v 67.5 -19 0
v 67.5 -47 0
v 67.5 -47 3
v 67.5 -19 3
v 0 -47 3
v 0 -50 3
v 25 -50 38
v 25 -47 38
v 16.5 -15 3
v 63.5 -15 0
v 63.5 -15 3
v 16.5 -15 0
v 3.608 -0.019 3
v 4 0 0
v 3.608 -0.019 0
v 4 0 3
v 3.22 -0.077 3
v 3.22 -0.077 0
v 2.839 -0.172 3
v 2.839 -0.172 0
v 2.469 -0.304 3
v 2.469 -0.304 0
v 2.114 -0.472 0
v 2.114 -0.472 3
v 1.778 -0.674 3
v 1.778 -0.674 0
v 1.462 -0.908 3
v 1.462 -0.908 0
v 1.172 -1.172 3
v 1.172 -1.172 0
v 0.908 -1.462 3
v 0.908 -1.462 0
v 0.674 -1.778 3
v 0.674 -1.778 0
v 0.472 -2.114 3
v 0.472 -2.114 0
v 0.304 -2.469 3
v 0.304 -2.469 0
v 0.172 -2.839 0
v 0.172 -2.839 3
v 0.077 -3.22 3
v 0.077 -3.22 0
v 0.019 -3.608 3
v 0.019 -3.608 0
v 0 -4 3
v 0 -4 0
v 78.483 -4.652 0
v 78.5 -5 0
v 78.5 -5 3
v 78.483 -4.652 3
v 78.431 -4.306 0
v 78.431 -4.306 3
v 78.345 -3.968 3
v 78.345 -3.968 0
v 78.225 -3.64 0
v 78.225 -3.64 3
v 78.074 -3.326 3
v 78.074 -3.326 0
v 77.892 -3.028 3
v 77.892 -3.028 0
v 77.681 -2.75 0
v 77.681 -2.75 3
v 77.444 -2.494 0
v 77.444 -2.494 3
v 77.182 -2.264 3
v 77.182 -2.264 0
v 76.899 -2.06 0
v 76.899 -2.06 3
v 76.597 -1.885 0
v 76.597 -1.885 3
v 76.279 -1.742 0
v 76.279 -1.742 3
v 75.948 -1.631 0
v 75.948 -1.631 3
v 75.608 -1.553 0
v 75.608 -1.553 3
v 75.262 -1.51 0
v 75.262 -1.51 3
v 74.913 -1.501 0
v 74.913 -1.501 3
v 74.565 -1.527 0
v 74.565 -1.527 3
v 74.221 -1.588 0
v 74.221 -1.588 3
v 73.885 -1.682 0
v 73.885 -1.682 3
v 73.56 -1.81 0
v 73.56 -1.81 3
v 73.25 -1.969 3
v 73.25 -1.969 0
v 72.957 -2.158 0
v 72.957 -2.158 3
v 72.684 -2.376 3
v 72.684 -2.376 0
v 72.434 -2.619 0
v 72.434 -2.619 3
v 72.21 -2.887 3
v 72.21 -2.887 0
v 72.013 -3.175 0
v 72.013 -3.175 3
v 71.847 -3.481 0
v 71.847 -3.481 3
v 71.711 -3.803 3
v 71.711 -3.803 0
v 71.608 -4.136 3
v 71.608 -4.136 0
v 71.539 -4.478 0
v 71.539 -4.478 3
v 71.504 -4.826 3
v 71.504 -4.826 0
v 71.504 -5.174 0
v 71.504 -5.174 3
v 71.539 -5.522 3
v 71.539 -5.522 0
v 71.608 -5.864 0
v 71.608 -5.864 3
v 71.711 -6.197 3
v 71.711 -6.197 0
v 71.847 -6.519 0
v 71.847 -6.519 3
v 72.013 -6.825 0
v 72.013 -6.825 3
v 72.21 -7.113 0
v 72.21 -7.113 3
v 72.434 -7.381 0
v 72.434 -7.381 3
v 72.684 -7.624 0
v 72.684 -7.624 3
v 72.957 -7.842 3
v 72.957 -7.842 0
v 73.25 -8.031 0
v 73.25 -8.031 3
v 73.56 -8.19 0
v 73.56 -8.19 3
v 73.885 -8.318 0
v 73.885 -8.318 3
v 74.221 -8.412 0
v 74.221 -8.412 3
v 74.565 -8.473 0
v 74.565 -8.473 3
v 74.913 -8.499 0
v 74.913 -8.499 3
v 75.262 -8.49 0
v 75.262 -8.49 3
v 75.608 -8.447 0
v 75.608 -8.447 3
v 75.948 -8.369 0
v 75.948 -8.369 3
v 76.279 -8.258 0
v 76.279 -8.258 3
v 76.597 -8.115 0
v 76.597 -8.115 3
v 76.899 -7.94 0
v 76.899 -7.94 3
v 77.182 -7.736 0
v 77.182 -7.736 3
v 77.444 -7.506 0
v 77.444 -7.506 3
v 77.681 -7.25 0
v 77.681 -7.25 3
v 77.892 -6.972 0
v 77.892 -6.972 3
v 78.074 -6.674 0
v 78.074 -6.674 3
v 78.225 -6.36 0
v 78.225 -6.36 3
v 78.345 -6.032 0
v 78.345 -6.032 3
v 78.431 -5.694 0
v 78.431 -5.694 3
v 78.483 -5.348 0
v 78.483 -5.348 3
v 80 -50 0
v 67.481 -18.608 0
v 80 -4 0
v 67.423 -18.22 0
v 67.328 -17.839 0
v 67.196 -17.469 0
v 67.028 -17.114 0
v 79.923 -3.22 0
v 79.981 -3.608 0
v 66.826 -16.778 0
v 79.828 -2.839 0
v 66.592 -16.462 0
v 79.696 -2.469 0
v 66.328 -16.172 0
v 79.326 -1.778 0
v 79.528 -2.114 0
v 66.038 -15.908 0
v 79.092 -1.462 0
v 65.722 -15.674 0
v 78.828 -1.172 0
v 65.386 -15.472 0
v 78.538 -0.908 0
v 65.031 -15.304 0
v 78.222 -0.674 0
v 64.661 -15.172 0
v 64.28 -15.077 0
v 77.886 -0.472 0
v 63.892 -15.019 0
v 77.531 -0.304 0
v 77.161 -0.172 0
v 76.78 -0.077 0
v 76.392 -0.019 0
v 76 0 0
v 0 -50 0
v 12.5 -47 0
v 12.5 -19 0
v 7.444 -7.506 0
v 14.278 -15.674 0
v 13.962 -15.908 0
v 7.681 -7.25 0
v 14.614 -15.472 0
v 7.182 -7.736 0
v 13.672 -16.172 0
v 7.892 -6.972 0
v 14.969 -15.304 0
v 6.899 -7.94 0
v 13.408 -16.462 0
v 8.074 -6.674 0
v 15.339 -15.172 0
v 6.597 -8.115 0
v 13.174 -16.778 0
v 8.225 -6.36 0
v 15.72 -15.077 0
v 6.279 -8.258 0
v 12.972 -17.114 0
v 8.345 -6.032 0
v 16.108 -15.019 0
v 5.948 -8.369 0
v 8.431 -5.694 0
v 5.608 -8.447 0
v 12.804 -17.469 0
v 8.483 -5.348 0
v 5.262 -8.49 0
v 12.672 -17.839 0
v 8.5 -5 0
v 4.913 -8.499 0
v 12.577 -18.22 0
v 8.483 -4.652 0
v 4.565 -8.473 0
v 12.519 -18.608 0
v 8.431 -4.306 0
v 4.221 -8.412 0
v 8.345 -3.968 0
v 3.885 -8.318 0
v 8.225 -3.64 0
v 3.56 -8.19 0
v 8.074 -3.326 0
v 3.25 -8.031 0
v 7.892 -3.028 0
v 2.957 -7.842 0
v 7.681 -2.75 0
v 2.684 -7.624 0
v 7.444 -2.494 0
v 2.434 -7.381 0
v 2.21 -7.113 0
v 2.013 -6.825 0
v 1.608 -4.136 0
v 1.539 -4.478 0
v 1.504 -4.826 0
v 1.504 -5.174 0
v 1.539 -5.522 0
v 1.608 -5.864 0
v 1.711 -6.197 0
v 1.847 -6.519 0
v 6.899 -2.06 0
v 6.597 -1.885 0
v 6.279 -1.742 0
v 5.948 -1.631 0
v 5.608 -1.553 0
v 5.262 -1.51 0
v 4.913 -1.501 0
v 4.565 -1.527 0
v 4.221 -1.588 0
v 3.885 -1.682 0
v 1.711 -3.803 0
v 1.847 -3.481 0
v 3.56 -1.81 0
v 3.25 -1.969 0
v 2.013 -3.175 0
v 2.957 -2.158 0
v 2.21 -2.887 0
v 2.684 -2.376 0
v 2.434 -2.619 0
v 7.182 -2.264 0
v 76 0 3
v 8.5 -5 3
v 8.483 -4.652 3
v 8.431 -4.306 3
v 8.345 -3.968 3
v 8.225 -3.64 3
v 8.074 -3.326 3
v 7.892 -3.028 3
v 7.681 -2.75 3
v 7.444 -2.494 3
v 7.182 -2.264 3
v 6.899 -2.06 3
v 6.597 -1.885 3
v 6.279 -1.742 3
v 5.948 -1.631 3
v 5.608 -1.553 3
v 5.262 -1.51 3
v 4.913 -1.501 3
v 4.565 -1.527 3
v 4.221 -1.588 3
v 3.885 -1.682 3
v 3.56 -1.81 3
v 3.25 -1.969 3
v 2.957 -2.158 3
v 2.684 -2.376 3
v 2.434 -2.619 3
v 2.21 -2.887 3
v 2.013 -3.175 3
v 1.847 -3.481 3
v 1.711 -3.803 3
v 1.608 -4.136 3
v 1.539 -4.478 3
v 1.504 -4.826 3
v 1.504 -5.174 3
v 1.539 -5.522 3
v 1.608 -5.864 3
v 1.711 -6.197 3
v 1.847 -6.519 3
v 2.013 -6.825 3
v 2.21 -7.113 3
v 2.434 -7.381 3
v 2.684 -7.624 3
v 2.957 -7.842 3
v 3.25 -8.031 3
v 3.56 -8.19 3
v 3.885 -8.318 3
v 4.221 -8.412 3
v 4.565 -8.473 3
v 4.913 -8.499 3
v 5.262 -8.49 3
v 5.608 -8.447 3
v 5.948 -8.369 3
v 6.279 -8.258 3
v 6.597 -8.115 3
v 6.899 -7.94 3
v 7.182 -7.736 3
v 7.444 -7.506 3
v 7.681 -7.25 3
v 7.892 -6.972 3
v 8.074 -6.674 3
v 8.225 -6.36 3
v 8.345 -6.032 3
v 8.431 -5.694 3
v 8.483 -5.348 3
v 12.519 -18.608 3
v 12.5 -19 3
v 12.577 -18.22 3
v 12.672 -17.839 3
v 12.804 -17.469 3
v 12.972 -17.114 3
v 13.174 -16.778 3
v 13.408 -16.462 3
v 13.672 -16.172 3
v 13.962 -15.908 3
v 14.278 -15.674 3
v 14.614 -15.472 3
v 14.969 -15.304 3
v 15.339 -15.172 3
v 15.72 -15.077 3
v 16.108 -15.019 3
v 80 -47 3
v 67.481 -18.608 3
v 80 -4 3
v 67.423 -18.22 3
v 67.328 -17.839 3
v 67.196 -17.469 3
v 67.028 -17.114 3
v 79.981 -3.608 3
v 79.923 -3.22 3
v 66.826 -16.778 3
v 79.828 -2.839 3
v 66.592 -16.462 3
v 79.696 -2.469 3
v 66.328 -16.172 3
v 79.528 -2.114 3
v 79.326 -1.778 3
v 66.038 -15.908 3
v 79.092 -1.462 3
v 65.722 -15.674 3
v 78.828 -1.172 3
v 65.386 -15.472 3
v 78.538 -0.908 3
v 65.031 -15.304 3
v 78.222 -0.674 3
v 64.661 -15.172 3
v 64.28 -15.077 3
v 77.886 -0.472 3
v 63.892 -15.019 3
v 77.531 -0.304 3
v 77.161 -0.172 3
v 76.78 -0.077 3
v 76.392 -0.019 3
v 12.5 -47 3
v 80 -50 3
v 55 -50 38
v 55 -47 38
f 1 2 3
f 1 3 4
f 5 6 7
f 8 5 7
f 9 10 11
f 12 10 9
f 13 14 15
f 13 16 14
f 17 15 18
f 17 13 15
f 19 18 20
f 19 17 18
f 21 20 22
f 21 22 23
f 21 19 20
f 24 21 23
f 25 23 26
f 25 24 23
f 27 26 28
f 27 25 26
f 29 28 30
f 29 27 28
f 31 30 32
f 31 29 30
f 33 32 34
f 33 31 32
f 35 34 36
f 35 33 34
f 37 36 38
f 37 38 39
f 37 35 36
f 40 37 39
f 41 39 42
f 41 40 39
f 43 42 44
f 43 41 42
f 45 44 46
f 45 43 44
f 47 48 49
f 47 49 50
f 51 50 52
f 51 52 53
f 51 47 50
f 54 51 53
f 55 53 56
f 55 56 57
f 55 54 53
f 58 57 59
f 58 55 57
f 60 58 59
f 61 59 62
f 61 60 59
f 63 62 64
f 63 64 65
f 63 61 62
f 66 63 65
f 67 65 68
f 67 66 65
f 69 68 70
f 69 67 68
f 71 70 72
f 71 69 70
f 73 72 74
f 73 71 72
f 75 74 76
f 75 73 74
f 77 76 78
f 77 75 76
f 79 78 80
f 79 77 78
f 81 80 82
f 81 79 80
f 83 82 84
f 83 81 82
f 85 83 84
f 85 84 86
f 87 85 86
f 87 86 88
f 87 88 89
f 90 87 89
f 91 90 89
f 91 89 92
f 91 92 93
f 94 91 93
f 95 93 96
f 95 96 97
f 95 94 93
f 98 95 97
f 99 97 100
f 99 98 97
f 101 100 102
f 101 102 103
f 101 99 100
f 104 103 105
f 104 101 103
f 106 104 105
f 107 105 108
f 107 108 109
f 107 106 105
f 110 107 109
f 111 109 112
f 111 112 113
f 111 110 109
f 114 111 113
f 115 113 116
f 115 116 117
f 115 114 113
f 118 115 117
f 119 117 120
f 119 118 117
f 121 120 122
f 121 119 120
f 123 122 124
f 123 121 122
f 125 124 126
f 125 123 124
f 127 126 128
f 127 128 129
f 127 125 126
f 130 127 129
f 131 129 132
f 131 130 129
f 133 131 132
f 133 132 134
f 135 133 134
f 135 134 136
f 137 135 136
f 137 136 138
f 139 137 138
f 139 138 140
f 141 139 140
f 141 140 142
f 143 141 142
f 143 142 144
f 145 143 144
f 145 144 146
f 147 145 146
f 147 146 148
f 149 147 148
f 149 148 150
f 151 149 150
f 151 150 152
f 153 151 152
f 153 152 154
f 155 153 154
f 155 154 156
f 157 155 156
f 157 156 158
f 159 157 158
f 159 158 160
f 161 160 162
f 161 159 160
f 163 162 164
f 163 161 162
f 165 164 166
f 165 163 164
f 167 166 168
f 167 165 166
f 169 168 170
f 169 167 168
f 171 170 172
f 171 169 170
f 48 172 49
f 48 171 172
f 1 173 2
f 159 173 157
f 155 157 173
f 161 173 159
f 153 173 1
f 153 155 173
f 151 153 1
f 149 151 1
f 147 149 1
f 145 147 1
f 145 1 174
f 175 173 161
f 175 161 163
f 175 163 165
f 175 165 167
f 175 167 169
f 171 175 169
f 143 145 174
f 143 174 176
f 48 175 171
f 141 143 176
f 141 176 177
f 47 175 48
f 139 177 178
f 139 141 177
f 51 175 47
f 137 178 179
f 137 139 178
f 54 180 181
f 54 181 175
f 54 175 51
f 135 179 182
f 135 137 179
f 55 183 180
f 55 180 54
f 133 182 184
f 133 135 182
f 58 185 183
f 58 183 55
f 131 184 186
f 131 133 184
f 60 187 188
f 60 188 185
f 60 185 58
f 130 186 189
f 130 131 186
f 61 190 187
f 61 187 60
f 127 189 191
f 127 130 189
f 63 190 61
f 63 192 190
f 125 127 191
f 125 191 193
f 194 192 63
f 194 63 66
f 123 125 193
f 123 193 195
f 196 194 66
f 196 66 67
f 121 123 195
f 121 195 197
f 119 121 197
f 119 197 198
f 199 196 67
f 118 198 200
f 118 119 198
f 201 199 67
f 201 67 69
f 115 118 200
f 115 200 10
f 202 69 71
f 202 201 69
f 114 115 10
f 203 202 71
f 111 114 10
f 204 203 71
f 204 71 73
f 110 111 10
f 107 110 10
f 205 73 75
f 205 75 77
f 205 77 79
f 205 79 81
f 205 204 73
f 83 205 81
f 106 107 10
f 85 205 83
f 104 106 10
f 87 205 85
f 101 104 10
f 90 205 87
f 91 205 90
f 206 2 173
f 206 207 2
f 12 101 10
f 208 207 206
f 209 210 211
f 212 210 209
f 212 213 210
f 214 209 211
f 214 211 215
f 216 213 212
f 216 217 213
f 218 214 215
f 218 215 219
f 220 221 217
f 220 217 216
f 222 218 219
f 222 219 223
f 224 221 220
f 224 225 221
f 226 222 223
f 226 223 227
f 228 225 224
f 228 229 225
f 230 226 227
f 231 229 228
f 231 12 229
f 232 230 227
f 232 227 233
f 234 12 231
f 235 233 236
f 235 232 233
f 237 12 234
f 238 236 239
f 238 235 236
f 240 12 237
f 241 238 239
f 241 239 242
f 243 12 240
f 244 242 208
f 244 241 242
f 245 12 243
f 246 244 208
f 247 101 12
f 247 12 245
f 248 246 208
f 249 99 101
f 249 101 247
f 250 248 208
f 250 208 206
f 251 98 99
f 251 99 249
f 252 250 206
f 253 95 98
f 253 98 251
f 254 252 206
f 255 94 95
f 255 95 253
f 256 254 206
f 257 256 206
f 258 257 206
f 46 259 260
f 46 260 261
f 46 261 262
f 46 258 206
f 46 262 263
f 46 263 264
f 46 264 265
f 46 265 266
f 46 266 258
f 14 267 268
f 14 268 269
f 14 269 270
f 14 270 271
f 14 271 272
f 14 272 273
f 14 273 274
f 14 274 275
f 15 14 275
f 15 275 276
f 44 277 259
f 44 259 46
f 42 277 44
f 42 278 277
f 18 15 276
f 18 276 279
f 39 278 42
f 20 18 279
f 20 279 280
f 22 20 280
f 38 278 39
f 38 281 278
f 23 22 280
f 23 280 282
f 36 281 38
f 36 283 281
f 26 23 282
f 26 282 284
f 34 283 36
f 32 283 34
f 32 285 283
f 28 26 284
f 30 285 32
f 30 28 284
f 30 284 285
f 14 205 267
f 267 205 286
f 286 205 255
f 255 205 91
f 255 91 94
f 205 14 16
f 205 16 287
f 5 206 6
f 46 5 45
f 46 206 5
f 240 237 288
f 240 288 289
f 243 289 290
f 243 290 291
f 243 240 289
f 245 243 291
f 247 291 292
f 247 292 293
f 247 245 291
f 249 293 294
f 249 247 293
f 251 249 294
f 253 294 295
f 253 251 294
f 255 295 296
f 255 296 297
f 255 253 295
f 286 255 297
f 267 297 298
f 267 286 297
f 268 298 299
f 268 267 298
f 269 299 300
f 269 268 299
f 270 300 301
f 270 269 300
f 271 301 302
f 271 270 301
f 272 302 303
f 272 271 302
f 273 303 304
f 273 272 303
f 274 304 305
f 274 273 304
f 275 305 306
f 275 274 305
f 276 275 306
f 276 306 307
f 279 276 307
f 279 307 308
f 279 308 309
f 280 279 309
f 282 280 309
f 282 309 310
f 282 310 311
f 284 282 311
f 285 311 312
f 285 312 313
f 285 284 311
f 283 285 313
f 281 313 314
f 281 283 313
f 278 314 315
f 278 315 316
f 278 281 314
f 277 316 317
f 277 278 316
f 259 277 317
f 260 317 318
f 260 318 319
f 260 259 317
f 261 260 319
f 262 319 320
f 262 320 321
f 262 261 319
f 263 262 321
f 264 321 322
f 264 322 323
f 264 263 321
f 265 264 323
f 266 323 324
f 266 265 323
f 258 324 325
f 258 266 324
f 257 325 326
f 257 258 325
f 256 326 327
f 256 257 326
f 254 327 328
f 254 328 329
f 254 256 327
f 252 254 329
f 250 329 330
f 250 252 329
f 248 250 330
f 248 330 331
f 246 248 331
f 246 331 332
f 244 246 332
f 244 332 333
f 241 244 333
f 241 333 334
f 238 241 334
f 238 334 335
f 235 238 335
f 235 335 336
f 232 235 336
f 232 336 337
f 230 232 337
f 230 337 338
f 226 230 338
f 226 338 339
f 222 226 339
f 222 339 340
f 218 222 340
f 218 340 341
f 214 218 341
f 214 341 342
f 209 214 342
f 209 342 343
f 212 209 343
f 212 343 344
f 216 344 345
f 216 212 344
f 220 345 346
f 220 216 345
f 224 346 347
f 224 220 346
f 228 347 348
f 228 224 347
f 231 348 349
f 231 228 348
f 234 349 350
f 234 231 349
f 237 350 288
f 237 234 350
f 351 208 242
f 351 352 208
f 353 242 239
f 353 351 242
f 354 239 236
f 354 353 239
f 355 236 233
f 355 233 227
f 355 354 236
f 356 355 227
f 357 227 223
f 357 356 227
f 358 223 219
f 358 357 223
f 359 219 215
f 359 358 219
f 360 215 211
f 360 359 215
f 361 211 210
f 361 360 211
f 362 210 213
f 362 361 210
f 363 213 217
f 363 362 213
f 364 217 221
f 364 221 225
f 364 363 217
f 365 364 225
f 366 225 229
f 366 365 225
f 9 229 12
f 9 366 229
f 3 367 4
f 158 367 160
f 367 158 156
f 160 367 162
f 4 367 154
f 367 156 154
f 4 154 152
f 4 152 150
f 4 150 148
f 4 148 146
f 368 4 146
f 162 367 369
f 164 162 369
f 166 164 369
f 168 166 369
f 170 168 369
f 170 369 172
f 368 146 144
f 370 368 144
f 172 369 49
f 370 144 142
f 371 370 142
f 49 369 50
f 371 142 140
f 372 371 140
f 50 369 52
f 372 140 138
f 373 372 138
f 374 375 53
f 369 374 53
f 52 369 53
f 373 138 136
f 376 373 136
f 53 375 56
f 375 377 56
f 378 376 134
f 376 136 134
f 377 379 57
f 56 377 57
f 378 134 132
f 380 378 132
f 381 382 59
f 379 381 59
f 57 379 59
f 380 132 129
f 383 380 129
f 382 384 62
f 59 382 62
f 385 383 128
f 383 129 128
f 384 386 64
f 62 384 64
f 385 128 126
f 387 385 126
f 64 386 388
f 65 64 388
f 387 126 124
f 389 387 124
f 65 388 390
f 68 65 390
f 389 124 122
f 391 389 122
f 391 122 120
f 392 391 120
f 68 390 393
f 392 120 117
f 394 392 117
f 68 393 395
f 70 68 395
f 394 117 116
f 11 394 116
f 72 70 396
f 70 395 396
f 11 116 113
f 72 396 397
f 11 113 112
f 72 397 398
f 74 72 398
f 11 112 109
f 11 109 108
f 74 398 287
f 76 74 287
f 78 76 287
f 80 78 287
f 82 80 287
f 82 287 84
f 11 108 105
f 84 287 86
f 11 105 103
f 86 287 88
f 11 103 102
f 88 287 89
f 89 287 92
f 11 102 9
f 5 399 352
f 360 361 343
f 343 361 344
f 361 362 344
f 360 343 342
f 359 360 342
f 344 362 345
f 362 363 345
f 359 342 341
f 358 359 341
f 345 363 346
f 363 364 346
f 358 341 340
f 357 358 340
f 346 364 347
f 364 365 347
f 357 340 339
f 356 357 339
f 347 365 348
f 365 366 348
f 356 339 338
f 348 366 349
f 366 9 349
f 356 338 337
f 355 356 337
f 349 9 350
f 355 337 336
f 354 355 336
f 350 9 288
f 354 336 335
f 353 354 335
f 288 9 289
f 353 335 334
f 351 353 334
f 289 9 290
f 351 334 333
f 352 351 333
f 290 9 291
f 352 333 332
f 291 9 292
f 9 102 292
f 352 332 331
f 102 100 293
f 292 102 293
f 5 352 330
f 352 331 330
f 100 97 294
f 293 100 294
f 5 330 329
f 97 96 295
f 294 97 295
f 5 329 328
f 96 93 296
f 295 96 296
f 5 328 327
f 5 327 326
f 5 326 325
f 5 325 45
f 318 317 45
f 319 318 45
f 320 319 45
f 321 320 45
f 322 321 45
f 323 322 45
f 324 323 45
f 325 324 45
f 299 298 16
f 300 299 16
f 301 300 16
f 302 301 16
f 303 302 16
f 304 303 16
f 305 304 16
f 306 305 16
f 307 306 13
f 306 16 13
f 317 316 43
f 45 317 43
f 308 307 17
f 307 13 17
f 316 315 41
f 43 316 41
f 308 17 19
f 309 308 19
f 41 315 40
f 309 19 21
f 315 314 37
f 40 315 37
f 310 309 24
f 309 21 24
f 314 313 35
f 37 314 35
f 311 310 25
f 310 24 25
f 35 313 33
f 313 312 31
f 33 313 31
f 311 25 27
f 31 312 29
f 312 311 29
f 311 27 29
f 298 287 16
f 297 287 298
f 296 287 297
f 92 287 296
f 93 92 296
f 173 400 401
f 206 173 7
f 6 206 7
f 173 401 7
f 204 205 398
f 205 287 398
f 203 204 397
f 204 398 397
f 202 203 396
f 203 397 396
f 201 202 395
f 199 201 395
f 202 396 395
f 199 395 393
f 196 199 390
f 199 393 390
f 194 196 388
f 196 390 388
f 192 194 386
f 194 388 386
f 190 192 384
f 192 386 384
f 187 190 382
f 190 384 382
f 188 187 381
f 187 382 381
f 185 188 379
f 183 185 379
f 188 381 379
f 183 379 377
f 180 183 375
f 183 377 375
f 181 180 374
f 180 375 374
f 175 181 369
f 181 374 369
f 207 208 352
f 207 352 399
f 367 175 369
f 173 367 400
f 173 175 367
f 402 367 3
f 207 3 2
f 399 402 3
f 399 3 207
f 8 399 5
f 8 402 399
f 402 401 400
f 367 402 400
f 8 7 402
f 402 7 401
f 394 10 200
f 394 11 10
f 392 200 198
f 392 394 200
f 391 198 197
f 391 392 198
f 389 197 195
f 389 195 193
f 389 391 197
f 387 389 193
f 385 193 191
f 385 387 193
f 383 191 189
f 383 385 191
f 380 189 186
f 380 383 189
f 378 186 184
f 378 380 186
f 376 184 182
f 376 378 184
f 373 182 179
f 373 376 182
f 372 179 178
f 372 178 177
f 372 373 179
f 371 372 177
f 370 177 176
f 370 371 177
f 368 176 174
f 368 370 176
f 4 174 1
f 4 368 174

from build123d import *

# Parameters (mm, degrees)
SKETCH_1_R      = 3.5
EXTRUDE_1_DEPTH = 3
FILLET_1_R      = 4
FILLET_2_R      = 4
FILLET_3_R      = 4
FILLET_4_R      = 4
EXTRUDE_2_DEPTH = 3


with BuildPart() as part:
    # 草图1 → 凸台-拉伸1 (new body)
    with BuildSketch(Plane.XY):
        Polygon((0, 0), (80, 0), (80, -50), (67.5, -50), (67.5, -15), (12.5, -15), (12.5, -50), (0, -50), align=None)
        with Locations((5, -5)):
            Circle(SKETCH_1_R, mode=Mode.SUBTRACT)
        with Locations((75, -5)):
            Circle(SKETCH_1_R, mode=Mode.SUBTRACT)
    extrude(amount=EXTRUDE_1_DEPTH)

    # 圆角1
    fillet_1_edges = [part.edges().sort_by_distance(p)[0] for p in [
        (0, 0, 1.5),
    ]]
    fillet(fillet_1_edges, radius=FILLET_1_R)

    # 圆角2
    fillet_2_edges = [part.edges().sort_by_distance(p)[0] for p in [
        (80, 0, 1.5),
    ]]
    fillet(fillet_2_edges, radius=FILLET_2_R)

    # 圆角3
    fillet_3_edges = [part.edges().sort_by_distance(p)[0] for p in [
        (12.5, -15, 1.5),
    ]]
    fillet(fillet_3_edges, radius=FILLET_3_R)

    # 圆角4
    fillet_4_edges = [part.edges().sort_by_distance(p)[0] for p in [
        (67.5, -15, 1.5),
    ]]
    fillet(fillet_4_edges, radius=FILLET_4_R)

    # 草图2 → 凸台-拉伸2 (add)
    with BuildSketch(Plane.XZ.offset(50)):
        Polygon((0, 3), (25, 38), (55, 38), (80, 3), (80, 0), (0, 0), align=None)
    extrude(amount=-EXTRUDE_2_DEPTH)


solid = part.part
